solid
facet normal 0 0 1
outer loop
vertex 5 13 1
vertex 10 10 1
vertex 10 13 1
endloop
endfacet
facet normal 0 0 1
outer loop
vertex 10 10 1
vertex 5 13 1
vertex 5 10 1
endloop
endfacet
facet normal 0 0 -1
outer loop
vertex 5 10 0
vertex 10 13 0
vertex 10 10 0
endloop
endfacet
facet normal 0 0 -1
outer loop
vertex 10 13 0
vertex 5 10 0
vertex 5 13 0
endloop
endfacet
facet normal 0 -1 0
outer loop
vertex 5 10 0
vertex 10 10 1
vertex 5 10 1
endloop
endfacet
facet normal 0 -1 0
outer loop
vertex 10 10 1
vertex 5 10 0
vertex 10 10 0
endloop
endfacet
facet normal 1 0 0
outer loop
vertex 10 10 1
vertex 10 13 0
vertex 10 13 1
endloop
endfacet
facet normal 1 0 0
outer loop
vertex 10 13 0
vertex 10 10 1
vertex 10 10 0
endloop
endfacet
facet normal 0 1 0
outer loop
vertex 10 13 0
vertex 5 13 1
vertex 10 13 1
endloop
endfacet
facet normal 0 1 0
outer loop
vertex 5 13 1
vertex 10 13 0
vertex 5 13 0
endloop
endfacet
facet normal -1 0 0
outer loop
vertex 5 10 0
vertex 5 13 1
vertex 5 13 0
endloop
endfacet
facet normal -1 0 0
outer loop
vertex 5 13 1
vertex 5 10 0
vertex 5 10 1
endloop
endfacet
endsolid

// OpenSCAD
translate([5,10,0]) cube([5,3,1]);
%color([0.5,0.5,1], alpha=0.3) cube([5,3,1]);
